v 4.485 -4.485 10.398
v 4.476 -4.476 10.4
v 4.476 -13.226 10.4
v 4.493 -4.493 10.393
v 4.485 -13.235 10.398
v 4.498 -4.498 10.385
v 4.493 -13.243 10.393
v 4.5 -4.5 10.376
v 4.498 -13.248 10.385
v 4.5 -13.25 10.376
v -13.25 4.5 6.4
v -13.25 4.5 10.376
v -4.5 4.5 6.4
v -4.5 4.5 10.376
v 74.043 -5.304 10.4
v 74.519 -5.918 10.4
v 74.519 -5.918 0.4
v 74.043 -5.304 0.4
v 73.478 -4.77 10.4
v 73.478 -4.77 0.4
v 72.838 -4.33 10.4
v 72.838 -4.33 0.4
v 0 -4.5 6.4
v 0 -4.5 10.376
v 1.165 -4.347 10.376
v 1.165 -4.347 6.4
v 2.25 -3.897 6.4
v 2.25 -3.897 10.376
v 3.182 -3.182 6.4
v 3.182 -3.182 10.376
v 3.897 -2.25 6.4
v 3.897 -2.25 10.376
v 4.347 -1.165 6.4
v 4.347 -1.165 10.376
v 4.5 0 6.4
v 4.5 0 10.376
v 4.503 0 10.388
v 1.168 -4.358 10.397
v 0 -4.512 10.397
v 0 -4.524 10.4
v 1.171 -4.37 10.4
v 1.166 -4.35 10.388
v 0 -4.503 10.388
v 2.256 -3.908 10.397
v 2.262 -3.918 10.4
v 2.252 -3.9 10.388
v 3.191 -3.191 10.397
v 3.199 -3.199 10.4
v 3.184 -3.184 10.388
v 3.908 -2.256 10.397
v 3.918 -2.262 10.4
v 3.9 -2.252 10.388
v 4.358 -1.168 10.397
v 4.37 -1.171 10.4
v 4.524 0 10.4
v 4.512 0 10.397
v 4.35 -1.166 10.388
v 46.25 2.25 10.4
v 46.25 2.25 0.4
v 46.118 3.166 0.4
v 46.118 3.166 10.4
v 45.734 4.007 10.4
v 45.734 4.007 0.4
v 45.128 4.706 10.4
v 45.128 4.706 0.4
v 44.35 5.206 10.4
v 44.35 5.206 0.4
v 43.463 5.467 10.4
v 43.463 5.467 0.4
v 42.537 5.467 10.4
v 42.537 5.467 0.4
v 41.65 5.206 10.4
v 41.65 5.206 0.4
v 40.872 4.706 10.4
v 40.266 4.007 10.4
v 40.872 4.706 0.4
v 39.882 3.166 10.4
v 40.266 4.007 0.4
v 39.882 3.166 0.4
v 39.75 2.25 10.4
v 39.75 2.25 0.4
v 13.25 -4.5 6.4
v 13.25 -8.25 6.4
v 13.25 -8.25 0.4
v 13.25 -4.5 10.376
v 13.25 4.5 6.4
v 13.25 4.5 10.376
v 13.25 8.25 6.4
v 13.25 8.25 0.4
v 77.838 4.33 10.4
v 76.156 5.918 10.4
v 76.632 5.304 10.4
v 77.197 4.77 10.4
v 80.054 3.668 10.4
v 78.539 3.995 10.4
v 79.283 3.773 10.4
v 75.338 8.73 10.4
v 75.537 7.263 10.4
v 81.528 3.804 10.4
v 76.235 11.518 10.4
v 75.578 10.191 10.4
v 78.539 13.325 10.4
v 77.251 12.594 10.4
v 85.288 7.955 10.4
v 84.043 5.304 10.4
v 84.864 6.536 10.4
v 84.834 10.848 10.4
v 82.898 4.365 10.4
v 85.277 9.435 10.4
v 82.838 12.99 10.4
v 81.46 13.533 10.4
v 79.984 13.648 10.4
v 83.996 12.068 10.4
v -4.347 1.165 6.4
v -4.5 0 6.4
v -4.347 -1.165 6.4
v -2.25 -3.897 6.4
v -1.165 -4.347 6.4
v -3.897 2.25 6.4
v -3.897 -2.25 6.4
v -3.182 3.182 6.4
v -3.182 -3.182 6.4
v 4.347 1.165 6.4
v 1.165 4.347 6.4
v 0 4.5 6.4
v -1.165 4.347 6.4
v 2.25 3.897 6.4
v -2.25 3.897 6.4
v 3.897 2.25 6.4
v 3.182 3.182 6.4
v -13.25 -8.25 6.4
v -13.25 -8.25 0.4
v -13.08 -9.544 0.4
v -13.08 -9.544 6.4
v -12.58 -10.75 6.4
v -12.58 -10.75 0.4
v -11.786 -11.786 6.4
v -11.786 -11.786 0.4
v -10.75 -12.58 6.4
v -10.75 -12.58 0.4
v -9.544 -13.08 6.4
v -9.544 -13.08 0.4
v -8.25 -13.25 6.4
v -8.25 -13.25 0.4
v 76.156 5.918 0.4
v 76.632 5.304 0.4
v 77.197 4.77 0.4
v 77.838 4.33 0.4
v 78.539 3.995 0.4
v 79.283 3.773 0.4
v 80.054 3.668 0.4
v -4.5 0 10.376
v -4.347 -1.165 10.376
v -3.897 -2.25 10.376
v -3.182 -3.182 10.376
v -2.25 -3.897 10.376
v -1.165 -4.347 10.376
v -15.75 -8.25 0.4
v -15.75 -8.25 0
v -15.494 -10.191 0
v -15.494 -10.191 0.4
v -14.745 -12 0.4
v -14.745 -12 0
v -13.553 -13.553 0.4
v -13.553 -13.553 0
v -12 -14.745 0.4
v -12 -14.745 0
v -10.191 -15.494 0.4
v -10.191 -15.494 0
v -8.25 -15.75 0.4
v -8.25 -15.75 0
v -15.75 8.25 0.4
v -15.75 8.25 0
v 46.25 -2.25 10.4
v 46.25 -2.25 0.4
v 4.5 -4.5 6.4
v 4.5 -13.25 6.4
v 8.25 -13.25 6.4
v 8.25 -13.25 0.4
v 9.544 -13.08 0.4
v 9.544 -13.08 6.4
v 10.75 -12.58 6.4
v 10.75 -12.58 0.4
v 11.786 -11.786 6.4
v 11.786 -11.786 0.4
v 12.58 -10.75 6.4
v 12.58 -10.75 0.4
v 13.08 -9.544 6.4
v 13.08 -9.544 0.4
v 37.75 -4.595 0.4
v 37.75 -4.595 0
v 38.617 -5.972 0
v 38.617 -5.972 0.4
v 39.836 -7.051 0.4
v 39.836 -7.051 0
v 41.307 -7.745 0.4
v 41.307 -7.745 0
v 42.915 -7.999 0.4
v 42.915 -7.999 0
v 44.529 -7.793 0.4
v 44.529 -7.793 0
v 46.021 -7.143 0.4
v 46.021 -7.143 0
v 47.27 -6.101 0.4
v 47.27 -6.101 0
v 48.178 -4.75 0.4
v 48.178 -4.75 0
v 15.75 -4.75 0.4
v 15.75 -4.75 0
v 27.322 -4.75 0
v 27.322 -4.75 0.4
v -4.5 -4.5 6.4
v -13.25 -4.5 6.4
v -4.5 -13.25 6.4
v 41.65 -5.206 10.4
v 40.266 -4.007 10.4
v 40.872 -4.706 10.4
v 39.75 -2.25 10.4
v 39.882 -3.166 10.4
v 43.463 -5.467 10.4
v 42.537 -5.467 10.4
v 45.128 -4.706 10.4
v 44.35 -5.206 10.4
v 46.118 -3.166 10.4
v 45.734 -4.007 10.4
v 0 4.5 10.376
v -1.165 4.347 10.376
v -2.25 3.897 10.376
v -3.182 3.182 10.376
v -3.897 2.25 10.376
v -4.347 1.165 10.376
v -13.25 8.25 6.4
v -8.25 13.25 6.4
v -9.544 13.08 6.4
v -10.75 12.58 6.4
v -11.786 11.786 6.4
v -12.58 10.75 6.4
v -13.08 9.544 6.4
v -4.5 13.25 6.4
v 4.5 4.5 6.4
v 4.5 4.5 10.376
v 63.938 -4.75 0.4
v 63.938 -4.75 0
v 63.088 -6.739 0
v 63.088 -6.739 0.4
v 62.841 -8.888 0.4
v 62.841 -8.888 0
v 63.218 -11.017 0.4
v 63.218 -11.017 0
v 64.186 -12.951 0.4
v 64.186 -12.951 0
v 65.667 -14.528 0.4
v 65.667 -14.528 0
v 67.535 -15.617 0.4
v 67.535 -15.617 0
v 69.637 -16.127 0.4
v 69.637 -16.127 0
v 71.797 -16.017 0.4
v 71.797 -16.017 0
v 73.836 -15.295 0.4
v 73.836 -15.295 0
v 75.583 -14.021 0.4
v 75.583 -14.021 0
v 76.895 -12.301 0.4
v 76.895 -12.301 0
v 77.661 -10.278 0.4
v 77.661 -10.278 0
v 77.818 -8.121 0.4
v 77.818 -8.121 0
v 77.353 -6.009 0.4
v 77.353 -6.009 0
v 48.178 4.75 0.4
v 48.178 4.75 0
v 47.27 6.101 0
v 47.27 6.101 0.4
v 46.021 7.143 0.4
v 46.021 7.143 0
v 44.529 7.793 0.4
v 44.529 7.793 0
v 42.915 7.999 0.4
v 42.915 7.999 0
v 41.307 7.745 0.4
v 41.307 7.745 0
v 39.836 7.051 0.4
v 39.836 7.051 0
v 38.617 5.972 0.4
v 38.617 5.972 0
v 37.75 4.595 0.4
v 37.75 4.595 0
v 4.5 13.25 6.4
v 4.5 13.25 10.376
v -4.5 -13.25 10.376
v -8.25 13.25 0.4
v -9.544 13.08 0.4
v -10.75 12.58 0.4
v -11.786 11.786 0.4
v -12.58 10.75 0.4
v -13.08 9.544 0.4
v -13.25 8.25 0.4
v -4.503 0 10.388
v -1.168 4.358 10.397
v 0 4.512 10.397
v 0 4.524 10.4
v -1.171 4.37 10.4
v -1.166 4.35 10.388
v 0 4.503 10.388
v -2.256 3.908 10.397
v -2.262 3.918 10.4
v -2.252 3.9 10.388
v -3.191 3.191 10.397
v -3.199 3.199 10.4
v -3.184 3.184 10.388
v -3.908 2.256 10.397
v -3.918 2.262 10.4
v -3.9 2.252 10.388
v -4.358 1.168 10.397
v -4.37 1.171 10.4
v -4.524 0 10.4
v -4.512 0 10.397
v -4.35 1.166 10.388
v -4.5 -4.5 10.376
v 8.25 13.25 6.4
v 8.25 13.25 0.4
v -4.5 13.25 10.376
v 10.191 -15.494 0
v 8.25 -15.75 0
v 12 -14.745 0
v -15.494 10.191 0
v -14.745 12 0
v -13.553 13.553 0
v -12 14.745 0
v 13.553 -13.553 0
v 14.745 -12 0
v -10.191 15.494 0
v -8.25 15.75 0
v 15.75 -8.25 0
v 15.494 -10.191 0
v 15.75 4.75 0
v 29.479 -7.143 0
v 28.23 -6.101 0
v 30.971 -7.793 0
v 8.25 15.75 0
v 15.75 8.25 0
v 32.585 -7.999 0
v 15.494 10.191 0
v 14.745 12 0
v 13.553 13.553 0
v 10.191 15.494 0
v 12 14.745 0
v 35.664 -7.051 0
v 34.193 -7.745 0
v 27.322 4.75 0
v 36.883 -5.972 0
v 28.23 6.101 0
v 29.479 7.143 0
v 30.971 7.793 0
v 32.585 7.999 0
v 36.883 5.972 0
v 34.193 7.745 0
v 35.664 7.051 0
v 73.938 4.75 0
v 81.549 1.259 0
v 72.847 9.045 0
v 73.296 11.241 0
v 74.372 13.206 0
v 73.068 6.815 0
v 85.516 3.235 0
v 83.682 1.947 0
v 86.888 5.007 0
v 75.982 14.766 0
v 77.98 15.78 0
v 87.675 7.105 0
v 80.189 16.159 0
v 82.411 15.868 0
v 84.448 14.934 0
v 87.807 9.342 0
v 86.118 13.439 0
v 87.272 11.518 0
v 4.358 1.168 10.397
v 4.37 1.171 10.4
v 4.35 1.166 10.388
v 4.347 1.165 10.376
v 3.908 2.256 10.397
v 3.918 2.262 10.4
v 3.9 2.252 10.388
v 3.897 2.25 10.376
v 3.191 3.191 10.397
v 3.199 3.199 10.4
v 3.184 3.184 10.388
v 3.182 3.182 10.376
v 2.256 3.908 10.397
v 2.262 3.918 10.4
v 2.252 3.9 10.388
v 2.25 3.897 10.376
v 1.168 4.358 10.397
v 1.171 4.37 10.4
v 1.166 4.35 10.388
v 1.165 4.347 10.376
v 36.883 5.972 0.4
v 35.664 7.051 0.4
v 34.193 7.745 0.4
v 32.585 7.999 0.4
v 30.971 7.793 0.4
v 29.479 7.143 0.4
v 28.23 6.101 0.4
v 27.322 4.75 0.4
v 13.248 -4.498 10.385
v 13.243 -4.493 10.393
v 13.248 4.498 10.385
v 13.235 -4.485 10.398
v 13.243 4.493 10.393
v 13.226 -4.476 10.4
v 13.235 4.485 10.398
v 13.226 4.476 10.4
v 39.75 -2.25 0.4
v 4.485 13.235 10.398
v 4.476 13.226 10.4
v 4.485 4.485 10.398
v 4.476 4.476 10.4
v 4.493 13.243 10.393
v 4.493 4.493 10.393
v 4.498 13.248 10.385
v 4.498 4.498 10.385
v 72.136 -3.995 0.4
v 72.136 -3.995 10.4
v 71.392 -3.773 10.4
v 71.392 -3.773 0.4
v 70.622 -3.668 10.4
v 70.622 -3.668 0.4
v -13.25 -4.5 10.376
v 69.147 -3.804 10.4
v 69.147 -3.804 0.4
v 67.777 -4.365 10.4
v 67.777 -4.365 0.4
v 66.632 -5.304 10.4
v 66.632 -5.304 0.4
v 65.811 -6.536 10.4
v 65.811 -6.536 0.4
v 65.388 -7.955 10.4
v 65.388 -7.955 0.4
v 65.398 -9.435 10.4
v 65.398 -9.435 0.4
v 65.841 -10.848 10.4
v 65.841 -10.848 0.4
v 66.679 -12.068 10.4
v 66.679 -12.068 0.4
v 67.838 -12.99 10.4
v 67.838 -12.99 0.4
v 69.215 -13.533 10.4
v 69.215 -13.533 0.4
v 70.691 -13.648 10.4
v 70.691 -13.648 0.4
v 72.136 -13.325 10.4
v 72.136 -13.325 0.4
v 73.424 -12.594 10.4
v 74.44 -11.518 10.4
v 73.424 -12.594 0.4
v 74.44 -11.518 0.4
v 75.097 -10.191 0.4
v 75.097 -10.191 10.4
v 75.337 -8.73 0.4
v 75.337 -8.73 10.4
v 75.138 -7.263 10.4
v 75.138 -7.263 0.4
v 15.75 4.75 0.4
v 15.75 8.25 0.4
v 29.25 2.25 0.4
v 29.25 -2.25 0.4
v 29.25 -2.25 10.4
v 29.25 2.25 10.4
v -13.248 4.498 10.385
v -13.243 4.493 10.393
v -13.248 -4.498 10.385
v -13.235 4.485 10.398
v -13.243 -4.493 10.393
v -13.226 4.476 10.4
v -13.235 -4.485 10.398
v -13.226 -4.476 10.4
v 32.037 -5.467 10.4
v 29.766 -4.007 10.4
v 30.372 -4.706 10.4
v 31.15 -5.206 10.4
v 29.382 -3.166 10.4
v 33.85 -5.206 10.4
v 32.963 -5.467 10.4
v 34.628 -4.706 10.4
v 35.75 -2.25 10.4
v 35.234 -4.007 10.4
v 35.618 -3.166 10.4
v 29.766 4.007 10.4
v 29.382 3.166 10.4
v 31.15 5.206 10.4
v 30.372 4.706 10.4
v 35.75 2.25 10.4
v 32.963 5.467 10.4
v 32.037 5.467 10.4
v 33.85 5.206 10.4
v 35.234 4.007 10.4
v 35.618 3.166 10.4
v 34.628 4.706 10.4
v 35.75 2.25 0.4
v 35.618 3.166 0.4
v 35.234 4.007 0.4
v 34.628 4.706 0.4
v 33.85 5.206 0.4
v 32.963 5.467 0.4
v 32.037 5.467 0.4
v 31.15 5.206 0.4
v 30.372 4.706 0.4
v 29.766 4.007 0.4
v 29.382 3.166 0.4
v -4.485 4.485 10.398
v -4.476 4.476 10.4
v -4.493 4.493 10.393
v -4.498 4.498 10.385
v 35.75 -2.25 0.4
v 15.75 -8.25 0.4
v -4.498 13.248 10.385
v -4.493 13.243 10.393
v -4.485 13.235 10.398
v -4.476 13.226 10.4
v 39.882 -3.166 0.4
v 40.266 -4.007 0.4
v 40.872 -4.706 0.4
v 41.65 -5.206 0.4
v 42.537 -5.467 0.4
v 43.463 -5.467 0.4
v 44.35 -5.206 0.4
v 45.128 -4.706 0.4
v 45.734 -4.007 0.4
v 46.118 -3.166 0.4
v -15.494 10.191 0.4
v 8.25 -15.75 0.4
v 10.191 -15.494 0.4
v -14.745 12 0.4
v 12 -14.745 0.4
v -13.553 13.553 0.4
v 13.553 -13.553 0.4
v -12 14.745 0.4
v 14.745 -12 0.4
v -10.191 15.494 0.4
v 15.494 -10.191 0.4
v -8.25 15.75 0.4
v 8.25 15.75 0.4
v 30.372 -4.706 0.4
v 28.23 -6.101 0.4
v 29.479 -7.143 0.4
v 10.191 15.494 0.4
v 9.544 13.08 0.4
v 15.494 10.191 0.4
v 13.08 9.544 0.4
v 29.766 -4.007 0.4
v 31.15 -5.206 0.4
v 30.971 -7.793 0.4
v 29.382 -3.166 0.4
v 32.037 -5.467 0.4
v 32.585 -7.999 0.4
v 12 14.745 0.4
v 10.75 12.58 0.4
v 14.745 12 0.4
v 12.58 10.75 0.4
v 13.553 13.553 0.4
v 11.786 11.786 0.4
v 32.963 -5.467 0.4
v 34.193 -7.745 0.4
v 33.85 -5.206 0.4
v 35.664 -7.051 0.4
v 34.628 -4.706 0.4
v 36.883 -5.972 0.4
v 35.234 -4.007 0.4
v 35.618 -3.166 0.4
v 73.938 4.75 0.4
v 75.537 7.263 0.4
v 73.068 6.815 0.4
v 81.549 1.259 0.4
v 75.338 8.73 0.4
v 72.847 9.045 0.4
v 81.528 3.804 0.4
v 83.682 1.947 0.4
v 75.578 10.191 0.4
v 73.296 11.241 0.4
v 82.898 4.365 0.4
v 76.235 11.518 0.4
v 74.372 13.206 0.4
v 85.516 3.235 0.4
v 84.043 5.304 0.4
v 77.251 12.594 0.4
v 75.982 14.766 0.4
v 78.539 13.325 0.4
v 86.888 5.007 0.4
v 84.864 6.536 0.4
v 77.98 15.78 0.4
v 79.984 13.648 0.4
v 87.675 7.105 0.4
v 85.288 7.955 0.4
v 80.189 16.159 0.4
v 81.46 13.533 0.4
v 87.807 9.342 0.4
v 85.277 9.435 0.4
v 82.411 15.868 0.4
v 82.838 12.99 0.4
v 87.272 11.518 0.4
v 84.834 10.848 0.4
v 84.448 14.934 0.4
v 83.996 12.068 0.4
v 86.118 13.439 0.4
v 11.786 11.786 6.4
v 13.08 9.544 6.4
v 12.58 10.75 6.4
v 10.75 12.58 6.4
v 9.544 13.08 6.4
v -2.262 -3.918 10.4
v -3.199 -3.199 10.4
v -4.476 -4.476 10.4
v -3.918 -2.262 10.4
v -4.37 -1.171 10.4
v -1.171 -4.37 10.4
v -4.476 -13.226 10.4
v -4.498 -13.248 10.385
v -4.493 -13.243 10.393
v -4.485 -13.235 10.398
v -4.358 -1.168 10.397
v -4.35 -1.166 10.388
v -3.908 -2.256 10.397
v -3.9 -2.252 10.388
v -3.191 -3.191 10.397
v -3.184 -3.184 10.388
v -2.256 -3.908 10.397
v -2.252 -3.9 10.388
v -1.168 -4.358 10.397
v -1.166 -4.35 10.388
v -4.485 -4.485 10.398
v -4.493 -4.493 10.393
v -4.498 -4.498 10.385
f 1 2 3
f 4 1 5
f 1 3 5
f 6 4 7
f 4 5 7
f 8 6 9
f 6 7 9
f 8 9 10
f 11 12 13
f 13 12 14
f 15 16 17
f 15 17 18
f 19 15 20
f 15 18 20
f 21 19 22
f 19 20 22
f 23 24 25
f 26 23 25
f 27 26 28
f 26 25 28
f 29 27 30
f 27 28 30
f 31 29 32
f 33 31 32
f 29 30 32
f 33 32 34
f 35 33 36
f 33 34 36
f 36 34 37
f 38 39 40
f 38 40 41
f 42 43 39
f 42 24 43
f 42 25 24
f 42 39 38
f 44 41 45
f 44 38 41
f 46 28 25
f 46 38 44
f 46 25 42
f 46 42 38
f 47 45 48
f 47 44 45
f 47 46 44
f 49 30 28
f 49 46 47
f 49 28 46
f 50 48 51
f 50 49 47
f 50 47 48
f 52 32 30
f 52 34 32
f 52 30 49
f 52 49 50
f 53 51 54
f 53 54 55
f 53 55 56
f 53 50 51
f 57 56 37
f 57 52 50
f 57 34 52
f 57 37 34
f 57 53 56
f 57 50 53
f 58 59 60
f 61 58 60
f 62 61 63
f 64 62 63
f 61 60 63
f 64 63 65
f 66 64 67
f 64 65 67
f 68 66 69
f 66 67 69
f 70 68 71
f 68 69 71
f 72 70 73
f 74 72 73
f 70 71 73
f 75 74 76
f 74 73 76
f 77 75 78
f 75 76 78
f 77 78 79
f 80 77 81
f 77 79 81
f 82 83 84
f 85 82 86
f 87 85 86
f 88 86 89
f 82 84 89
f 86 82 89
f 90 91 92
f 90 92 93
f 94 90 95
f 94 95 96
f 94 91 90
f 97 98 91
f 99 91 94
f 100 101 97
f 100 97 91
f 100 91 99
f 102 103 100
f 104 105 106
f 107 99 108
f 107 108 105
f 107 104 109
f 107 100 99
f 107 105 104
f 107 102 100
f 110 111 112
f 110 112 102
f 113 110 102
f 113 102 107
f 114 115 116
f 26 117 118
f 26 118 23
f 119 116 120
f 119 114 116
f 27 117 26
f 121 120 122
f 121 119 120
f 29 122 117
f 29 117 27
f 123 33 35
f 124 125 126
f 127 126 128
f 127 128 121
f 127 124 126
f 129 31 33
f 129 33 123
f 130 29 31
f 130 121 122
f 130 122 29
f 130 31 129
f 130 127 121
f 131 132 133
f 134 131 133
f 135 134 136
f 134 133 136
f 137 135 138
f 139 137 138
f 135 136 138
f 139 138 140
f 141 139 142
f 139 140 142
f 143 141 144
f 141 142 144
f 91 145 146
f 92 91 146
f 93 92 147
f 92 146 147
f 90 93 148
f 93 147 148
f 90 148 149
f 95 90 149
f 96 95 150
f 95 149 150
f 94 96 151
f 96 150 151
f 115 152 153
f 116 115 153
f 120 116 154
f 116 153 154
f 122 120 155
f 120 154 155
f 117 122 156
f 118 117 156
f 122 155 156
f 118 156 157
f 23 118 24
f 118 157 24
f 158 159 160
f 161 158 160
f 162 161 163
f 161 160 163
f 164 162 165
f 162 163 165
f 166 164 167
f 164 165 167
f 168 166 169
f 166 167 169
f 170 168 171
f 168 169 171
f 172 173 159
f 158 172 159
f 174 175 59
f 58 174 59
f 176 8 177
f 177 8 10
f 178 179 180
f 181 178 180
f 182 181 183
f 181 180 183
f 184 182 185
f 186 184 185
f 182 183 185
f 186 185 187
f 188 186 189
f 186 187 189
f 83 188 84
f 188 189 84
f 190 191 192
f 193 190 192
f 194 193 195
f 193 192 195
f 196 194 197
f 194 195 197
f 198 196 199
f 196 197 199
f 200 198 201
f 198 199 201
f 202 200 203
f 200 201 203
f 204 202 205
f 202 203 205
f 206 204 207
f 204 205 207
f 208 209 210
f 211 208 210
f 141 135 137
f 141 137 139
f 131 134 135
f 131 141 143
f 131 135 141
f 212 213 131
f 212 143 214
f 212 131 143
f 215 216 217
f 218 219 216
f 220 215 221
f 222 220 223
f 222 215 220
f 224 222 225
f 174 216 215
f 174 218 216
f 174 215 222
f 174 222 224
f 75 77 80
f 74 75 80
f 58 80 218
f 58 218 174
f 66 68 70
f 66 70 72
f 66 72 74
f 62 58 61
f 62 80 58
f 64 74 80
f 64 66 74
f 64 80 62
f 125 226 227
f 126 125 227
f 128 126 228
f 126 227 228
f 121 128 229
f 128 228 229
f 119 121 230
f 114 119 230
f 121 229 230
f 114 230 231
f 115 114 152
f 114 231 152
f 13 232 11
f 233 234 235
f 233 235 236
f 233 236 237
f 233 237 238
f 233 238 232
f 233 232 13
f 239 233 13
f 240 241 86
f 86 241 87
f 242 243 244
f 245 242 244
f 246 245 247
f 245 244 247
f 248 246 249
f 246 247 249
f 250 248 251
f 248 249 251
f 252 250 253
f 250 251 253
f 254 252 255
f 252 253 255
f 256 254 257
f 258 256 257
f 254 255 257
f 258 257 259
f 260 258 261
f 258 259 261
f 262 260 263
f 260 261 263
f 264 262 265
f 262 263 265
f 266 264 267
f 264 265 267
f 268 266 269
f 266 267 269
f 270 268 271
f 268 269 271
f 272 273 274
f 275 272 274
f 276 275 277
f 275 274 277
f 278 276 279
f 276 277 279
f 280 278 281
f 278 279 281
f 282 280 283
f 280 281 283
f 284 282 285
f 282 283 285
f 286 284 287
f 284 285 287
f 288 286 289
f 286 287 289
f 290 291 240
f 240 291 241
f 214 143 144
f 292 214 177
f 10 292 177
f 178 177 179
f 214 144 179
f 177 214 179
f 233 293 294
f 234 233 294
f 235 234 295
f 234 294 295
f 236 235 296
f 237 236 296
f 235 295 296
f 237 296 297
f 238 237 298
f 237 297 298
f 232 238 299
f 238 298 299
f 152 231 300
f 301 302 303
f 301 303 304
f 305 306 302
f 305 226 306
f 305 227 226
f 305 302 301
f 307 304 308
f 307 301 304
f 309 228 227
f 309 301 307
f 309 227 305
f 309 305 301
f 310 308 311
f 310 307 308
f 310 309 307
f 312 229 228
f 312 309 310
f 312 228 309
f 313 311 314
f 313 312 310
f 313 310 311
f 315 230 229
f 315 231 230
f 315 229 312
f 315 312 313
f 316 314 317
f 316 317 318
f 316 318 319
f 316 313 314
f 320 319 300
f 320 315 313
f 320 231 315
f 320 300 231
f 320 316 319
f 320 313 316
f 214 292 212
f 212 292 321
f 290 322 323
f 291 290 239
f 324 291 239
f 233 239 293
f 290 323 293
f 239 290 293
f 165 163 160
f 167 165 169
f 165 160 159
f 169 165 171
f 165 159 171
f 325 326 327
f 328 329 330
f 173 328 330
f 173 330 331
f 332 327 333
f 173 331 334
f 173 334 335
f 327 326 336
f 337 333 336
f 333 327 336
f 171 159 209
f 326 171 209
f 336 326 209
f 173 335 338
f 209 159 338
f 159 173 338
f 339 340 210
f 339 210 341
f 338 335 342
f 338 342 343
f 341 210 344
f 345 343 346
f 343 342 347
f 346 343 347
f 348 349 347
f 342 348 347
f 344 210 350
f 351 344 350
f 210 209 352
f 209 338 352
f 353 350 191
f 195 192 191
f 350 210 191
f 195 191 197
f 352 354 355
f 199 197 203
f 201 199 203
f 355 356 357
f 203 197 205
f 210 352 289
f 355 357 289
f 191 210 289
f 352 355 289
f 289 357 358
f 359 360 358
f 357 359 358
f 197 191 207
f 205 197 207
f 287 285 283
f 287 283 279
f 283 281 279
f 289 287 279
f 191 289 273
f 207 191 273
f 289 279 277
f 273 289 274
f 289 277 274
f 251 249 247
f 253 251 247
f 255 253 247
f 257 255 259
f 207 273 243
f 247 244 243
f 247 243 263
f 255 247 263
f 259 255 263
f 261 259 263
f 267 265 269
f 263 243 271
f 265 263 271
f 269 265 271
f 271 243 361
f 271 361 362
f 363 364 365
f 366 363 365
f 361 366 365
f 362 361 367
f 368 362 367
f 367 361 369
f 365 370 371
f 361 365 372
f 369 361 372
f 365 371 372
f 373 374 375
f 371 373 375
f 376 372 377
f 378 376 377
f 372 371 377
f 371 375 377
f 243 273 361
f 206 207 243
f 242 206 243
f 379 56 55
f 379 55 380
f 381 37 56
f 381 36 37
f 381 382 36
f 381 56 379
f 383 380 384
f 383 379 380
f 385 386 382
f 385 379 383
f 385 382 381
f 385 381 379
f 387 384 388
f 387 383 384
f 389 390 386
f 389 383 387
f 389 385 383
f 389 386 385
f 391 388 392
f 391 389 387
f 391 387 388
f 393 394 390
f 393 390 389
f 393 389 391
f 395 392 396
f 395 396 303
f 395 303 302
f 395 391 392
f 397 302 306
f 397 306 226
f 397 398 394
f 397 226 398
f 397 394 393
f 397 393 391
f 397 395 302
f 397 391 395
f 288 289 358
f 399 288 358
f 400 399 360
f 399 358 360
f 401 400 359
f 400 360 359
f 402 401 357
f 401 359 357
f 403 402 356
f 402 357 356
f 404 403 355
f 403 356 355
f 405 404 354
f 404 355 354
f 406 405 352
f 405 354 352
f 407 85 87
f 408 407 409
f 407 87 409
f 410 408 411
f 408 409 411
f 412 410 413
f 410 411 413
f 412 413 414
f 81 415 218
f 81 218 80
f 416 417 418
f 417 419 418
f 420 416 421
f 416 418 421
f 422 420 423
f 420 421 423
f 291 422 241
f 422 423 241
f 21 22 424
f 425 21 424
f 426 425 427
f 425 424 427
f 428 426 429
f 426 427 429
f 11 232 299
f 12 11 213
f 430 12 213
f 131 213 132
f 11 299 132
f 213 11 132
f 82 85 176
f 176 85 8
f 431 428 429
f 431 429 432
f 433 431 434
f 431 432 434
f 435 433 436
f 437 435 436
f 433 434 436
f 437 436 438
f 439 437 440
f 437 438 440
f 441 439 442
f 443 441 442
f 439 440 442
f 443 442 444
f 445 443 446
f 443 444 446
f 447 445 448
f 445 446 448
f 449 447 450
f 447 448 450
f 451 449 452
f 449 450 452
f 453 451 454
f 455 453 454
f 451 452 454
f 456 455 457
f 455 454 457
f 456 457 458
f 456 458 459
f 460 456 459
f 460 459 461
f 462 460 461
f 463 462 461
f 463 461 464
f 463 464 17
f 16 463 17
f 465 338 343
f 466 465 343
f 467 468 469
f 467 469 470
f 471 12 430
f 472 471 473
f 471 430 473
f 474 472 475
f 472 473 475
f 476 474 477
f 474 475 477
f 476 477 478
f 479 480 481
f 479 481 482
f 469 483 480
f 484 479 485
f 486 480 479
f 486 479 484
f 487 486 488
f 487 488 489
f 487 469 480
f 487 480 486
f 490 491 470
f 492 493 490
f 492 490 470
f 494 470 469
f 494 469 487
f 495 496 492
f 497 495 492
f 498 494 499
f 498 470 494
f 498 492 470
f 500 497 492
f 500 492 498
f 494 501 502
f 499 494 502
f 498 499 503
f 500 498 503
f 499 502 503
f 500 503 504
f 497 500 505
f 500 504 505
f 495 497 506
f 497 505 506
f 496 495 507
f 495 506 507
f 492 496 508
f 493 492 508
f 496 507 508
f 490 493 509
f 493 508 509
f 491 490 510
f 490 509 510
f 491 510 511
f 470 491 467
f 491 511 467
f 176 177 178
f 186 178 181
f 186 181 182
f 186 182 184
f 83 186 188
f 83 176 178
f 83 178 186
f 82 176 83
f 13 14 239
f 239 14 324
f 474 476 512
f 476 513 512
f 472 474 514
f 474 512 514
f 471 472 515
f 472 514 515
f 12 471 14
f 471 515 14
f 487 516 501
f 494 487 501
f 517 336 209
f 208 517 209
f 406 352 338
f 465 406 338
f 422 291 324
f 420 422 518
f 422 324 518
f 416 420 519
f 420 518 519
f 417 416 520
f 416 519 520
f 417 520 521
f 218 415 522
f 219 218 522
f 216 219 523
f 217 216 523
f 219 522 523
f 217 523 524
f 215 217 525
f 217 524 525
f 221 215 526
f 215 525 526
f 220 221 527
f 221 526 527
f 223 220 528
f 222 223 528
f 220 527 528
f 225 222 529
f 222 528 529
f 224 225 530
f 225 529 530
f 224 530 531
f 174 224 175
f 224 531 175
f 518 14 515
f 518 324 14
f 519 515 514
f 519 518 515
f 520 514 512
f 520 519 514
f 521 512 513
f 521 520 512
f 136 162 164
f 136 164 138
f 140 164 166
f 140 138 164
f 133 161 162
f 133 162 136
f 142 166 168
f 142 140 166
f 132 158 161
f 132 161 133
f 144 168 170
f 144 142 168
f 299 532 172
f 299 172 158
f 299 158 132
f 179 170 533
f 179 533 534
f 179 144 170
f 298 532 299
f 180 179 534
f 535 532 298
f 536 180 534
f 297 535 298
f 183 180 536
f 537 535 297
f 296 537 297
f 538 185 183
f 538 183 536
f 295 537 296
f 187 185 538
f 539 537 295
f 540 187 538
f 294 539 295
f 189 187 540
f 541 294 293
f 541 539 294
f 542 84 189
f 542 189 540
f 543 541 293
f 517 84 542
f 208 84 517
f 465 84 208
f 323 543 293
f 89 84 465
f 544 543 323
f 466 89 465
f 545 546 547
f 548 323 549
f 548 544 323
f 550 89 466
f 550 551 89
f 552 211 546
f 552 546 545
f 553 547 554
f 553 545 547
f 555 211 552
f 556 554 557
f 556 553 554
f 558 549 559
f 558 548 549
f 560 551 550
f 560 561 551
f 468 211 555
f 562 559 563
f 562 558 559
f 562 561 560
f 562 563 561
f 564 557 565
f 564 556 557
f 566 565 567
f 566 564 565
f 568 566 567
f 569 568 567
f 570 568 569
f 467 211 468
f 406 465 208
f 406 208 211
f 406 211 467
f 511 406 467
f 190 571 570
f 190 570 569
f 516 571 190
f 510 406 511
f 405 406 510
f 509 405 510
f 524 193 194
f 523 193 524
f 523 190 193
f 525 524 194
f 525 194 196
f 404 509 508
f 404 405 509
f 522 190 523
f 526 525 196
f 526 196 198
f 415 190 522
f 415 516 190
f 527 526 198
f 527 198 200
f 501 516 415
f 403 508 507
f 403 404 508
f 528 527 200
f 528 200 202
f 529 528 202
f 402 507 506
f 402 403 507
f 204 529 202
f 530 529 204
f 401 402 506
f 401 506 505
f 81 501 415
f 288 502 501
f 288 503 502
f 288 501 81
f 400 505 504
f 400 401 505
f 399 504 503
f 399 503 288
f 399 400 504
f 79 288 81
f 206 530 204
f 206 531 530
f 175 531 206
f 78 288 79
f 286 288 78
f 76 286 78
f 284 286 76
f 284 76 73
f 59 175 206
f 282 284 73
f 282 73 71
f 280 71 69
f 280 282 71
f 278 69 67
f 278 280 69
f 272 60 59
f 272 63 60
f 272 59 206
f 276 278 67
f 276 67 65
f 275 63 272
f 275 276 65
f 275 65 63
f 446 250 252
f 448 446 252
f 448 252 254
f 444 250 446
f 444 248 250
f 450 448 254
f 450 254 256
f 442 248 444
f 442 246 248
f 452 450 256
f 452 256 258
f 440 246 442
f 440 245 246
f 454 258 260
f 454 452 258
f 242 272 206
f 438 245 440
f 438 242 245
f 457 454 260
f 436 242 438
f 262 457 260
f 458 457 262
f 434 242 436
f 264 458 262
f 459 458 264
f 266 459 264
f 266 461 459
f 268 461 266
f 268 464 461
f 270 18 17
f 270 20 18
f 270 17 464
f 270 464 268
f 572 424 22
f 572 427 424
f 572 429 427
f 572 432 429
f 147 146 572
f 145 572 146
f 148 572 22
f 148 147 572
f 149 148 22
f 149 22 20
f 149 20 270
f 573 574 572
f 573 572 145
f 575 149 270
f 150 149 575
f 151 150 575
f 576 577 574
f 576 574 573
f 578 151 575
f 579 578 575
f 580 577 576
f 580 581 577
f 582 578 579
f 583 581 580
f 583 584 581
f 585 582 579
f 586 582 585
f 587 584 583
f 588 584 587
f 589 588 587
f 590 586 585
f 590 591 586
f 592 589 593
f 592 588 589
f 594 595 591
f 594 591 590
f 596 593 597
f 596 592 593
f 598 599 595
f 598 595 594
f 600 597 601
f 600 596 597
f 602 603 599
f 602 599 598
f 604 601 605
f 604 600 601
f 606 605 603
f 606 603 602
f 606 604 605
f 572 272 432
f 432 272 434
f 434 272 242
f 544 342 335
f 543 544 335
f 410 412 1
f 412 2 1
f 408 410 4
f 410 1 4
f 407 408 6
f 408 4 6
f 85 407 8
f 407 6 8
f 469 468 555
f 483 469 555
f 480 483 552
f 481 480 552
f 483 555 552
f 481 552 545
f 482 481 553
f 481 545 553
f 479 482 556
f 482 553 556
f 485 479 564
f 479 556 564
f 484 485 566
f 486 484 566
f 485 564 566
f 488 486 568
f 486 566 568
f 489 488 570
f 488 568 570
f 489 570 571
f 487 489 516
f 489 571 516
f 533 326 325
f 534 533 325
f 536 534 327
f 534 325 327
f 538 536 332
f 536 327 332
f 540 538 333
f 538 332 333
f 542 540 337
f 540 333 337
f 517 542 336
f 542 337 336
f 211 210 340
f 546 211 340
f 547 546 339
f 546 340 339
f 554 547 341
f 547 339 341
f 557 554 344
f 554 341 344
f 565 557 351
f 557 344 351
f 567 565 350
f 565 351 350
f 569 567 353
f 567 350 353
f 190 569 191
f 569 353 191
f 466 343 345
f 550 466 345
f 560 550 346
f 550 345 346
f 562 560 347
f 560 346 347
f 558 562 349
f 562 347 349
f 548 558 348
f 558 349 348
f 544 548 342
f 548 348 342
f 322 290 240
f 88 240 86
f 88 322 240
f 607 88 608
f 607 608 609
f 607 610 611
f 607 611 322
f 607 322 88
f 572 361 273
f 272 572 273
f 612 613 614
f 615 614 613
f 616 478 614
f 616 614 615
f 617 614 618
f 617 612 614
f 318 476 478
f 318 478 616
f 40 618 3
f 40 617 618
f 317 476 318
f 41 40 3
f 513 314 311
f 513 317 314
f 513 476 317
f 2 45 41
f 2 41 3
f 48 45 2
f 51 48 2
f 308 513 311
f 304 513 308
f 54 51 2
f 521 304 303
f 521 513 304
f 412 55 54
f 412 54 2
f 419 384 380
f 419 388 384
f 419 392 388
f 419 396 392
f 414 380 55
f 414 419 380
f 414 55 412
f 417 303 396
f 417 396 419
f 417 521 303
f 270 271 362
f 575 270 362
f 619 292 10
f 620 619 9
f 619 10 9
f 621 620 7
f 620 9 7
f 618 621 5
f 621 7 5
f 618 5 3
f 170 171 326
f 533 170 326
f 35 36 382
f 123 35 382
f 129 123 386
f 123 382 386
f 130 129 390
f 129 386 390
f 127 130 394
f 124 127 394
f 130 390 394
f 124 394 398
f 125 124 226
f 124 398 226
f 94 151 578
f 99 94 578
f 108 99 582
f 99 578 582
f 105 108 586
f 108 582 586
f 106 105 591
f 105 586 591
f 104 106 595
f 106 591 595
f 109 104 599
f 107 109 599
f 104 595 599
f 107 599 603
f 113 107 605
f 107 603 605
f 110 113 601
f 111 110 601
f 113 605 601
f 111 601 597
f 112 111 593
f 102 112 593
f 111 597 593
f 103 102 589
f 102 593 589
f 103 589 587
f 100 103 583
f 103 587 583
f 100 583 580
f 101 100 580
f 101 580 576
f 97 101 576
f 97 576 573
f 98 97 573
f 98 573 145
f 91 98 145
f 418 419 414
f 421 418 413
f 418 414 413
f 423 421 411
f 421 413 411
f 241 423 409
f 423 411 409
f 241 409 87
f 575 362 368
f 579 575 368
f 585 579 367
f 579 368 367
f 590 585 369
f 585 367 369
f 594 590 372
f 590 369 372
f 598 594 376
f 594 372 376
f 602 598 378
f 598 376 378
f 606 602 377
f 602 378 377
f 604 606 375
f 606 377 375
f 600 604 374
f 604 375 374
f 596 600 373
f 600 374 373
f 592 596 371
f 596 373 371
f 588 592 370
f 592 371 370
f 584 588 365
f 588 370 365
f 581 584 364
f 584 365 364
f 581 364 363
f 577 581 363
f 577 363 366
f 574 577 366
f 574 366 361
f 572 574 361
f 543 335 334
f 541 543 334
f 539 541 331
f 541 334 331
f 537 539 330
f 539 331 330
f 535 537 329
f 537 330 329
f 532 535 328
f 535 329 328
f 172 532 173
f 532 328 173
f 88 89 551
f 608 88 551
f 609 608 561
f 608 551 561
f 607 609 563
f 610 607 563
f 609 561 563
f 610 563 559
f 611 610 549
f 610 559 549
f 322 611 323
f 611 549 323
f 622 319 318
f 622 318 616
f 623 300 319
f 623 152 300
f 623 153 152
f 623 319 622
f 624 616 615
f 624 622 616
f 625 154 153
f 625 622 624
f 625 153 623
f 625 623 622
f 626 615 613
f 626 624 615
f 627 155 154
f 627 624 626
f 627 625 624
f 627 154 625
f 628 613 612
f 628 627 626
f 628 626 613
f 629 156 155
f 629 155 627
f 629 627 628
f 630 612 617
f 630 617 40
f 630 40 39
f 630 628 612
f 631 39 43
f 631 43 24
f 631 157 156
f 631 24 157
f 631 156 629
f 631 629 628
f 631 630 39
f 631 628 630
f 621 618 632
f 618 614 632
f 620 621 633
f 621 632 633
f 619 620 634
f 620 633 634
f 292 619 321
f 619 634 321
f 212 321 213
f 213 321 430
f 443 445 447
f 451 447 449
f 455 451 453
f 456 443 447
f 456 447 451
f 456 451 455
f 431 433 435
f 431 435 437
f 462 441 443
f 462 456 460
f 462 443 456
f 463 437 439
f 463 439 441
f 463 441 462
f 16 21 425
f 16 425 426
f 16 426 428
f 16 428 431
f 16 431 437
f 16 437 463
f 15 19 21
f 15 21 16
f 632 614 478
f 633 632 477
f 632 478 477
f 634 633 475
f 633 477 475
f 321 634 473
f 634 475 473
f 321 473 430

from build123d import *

# Parameters (mm, degrees)
F0_W     = 6.5
F0_H     = 4.5
F0_W_2   = 4
F0_W_3   = 16
F1_DEPTH = 0.4
F2_W     = 6.5
F2_H     = 4.5
F3_DEPTH = 10
F5_DEPTH = 4
F6_R     = 0.0241421356


with BuildPart() as f1:
    # F0 (on Top) → F1 (new body)
    with BuildSketch(Plane.XY):
        with BuildLine():
            Line((8.25, 15.75), (-8.25, 15.75))
            ThreePointArc((-8.25, 15.75), (-13.5533008589, 13.5533008589), (-15.75, 8.25))
            Line((-15.75, 8.25), (-15.75, -8.25))
            ThreePointArc((-15.75, -8.25), (-13.5533008589, -13.5533008589), (-8.25, -15.75))
            Line((-8.25, -15.75), (8.25, -15.75))
            ThreePointArc((8.25, -15.75), (13.5533008589, -13.5533008589), (15.75, -8.25))
            Line((15.75, -8.25), (15.75, -4.75))
            Line((15.75, -4.75), (27.3219212057, -4.75))
            ThreePointArc((27.3219212057, -4.75), (32.5853423404, -7.9993666334), (37.75, -4.5952078799))
            ThreePointArc((37.75, -4.5952078799), (42.9146576596, -7.9993666334), (48.1780787943, -4.75))
            Line((48.1780787943, -4.75), (63.9376083391, -4.75))
            ThreePointArc((63.9376083391, -4.75), (69.6369704789, -16.1274567319), (77.3532689299, -6.0087617221))
            Line((77.3532689299, -6.0087617221), (81.5491755468, 1.2587617221))
            ThreePointArc((81.5491755468, 1.2587617221), (83.4644385935, 15.4773568118), (73.9376083391, 4.75))
            Line((73.9376083391, 4.75), (48.1780787943, 4.75))
            ThreePointArc((48.1780787943, 4.75), (42.9146576596, 7.9993666334), (37.75, 4.5952078799))
            ThreePointArc((37.75, 4.5952078799), (32.5853423404, 7.9993666334), (27.3219212057, 4.75))
            Line((27.3219212057, 4.75), (15.75, 4.75))
            Line((15.75, 4.75), (15.75, 8.25))
            ThreePointArc((15.75, 8.25), (13.5533008589, 13.5533008589), (8.25, 15.75))
        make_face()
        with BuildLine():
            ThreePointArc((-13.25, 8.25), (-11.7855339059, 11.7855339059), (-8.25, 13.25))
            Line((-8.25, 13.25), (-4.5, 13.25))
            Line((-4.5, 13.25), (4.5, 13.25))
            Line((4.5, 13.25), (8.25, 13.25))
            ThreePointArc((8.25, 13.25), (11.7855339059, 11.7855339059), (13.25, 8.25))
            Line((13.25, 8.25), (13.25, 4.5))
            Line((13.25, 4.5), (13.25, 2.25))
            Line((13.25, 2.25), (29.25, 2.25))
            ThreePointArc((29.25, 2.25), (32.5, 5.5), (35.75, 2.25))
            Line((35.75, 2.25), (39.75, 2.25))
            ThreePointArc((39.75, 2.25), (43, 5.5), (46.25, 2.25))
            Line((46.25, 2.25), (74.0385634647, 2.25))
            Line((74.0385634647, 2.25), (76.1564730244, 5.9183269633))
            ThreePointArc((76.1564730244, 5.9183269633), (82.8376015704, 12.9903810568), (80.0535873414, 3.6683269633))
            Line((80.0535873414, 3.6683269633), (74.5187301163, -5.9183269633))
            ThreePointArc((74.5187301163, -5.9183269633), (67.8376015704, -12.9903810568), (70.6216157993, -3.6683269633))
            Line((70.6216157993, -3.6683269633), (71.4404872533, -2.25))
            Line((71.4404872533, -2.25), (46.25, -2.25))
            ThreePointArc((46.25, -2.25), (43, -5.5), (39.75, -2.25))
            Line((39.75, -2.25), (35.75, -2.25))
            ThreePointArc((35.75, -2.25), (32.5, -5.5), (29.25, -2.25))
            Line((29.25, -2.25), (13.25, -2.25))
            Line((13.25, -2.25), (13.25, -4.5))
            Line((13.25, -4.5), (13.25, -8.25))
            ThreePointArc((13.25, -8.25), (11.7855339059, -11.7855339059), (8.25, -13.25))
            Line((8.25, -13.25), (4.5, -13.25))
            Line((4.5, -13.25), (-4.5, -13.25))
            Line((-4.5, -13.25), (-8.25, -13.25))
            ThreePointArc((-8.25, -13.25), (-11.7855339059, -11.7855339059), (-13.25, -8.25))
            Line((-13.25, -8.25), (-13.25, -4.5))
            Line((-13.25, -4.5), (-13.25, 4.5))
            Line((-13.25, 4.5), (-13.25, 8.25))
        make_face(mode=Mode.SUBTRACT)
        Polygon((4.5, -4.5), (0, -4.5), (-4.5, -4.5), (-4.5, -13.25), (4.5, -13.25), align=None)
        with BuildLine():
            Line((76.1564730244, 5.9183269633), (74.0385634647, 2.25))
            Line((74.0385634647, 2.25), (71.4404872533, -2.25))
            Line((71.4404872533, -2.25), (70.6216157993, -3.6683269633))
            ThreePointArc((70.6216157993, -3.6683269633), (72.8376015704, -4.3301270189), (74.5187301163, -5.9183269633))
            Line((74.5187301163, -5.9183269633), (80.0535873414, 3.6683269633))
            ThreePointArc((80.0535873414, 3.6683269633), (77.8376015704, 4.3301270189), (76.1564730244, 5.9183269633))
        make_face()
        with Locations((32.5, 0)):
            Rectangle(F0_W, F0_H)
        with BuildLine():
            ThreePointArc((35.75, 2.25), (32.5, 5.5), (29.25, 2.25))
            Line((29.25, 2.25), (35.75, 2.25))
        make_face()
        Polygon((74.0385634647, 2.25), (46.25, 2.25), (46.25, -2.25), (71.4404872533, -2.25), align=None)
        with BuildLine():
            Line((35.75, -2.25), (29.25, -2.25))
            ThreePointArc((29.25, -2.25), (32.5, -5.5), (35.75, -2.25))
        make_face()
        with Locations((37.75, 0)):
            Rectangle(F0_W_2, F0_H)
        Polygon((-4.5, 0), (-4.5, 4.5), (-13.25, 4.5), (-13.25, -4.5), (-4.5, -4.5), align=None)
        with BuildLine():
            ThreePointArc((46.25, 2.25), (43, 5.5), (39.75, 2.25))
            Line((39.75, 2.25), (46.25, 2.25))
        make_face()
        with BuildLine():
            Line((-4.5, -4.5), (-13.25, -4.5))
            Line((-13.25, -4.5), (-13.25, -8.25))
            ThreePointArc((-13.25, -8.25), (-11.7855339059, -11.7855339059), (-8.25, -13.25))
            Line((-8.25, -13.25), (-4.5, -13.25))
            Line((-4.5, -13.25), (-4.5, -4.5))
        make_face()
        with BuildLine():
            Line((13.25, -4.5), (4.5, -4.5))
            Line((4.5, -4.5), (4.5, -13.25))
            Line((4.5, -13.25), (8.25, -13.25))
            ThreePointArc((8.25, -13.25), (11.7855339059, -11.7855339059), (13.25, -8.25))
            Line((13.25, -8.25), (13.25, -4.5))
        make_face()
        with BuildLine():
            Line((46.25, -2.25), (39.75, -2.25))
            ThreePointArc((39.75, -2.25), (43, -5.5), (46.25, -2.25))
        make_face()
        with BuildLine():
            ThreePointArc((74.5187301163, -5.9183269633), (72.8376015704, -4.3301270189), (70.6216157993, -3.6683269633))
            ThreePointArc((70.6216157993, -3.6683269633), (67.8376015704, -12.9903810568), (74.5187301163, -5.9183269633))
        make_face()
        with BuildLine():
            ThreePointArc((80.0535873414, 3.6683269633), (82.8376015704, 12.9903810568), (76.1564730244, 5.9183269633))
            ThreePointArc((76.1564730244, 5.9183269633), (77.8376015704, 4.3301270189), (80.0535873414, 3.6683269633))
        make_face()
        Polygon((13.25, 4.5), (4.5, 4.5), (4.5, 0), (4.5, -4.5), (13.25, -4.5), (13.25, -2.25), (13.25, 2.25), align=None)
        with BuildLine():
            Line((-4.5, 13.25), (-8.25, 13.25))
            ThreePointArc((-8.25, 13.25), (-11.7855339059, 11.7855339059), (-13.25, 8.25))
            Line((-13.25, 8.25), (-13.25, 4.5))
            Line((-13.25, 4.5), (-4.5, 4.5))
            Line((-4.5, 4.5), (-4.5, 13.25))
        make_face()
        Polygon((4.5, 13.25), (-4.5, 13.25), (-4.5, 4.5), (0, 4.5), (4.5, 4.5), align=None)
        with BuildLine():
            Line((8.25, 13.25), (4.5, 13.25))
            Line((4.5, 13.25), (4.5, 4.5))
            Line((4.5, 4.5), (13.25, 4.5))
            Line((13.25, 4.5), (13.25, 8.25))
            ThreePointArc((13.25, 8.25), (11.7855339059, 11.7855339059), (8.25, 13.25))
        make_face()
        with Locations((21.25, 0)):
            Rectangle(F0_W_3, F0_H)
        with Locations((43, 0)):
            Rectangle(F0_W, F0_H)
        with BuildLine():
            ThreePointArc((0, 4.5), (-3.1819805153, 3.1819805153), (-4.5, 0))
            ThreePointArc((-4.5, 0), (-3.1819805153, -3.1819805153), (0, -4.5))
            ThreePointArc((0, -4.5), (3.1819805153, -3.1819805153), (4.5, 0))
            ThreePointArc((4.5, 0), (3.1819805153, 3.1819805153), (0, 4.5))
        make_face()
        with BuildLine():
            Line((4.5, 0), (4.5, 4.5))
            Line((4.5, 4.5), (0, 4.5))
            ThreePointArc((0, 4.5), (3.1819805153, 3.1819805153), (4.5, 0))
        make_face()
        with BuildLine():
            Line((4.5, -4.5), (4.5, 0))
            ThreePointArc((4.5, 0), (3.1819805153, -3.1819805153), (0, -4.5))
            Line((0, -4.5), (4.5, -4.5))
        make_face()
        with BuildLine():
            ThreePointArc((0, -4.5), (-3.1819805153, -3.1819805153), (-4.5, 0))
            Line((-4.5, 0), (-4.5, -4.5))
            Line((-4.5, -4.5), (0, -4.5))
        make_face()
        with BuildLine():
            Line((0, 4.5), (-4.5, 4.5))
            Line((-4.5, 4.5), (-4.5, 0))
            ThreePointArc((-4.5, 0), (-3.1819805153, 3.1819805153), (0, 4.5))
        make_face()
    extrude(amount=F1_DEPTH)

    # F2 (on face) → F3 (join)
    with BuildSketch(Plane.XY.offset(0.4)):
        Polygon((4.5, 13.25), (-4.5, 13.25), (-4.5, 4.5), (0, 4.5), (4.5, 4.5), align=None)
        Polygon((-4.5, 0), (-4.5, 4.5), (-13.25, 4.5), (-13.25, -4.5), (-4.5, -4.5), align=None)
        Polygon((13.25, 4.5), (4.5, 4.5), (4.5, 0), (4.5, -4.5), (13.25, -4.5), (13.25, -2.25), (13.25, 2.25), align=None)
        Polygon((4.5, -4.5), (0, -4.5), (-4.5, -4.5), (-4.5, -13.25), (4.5, -13.25), align=None)
        with BuildLine():
            Line((4.5, -4.5), (4.5, 0))
            ThreePointArc((4.5, 0), (3.1819805153, -3.1819805153), (0, -4.5))
            Line((0, -4.5), (4.5, -4.5))
        make_face()
        with BuildLine():
            ThreePointArc((0, -4.5), (-3.1819805153, -3.1819805153), (-4.5, 0))
            Line((-4.5, 0), (-4.5, -4.5))
            Line((-4.5, -4.5), (0, -4.5))
        make_face()
        with BuildLine():
            Line((0, 4.5), (-4.5, 4.5))
            Line((-4.5, 4.5), (-4.5, 0))
            ThreePointArc((-4.5, 0), (-3.1819805153, 3.1819805153), (0, 4.5))
        make_face()
        with BuildLine():
            Line((4.5, 0), (4.5, 4.5))
            Line((4.5, 4.5), (0, 4.5))
            ThreePointArc((0, 4.5), (3.1819805153, 3.1819805153), (4.5, 0))
        make_face()
        with Locations((32.5, 0)):
            Rectangle(F2_W, F2_H)
        with BuildLine():
            ThreePointArc((35.75, 2.25), (32.5, 5.5), (29.25, 2.25))
            Line((29.25, 2.25), (35.75, 2.25))
        make_face()
        with BuildLine():
            Line((35.75, -2.25), (29.25, -2.25))
            ThreePointArc((29.25, -2.25), (32.5, -5.5), (35.75, -2.25))
        make_face()
        with BuildLine():
            ThreePointArc((46.25, 2.25), (43, 5.5), (39.75, 2.25))
            Line((39.75, 2.25), (46.25, 2.25))
        make_face()
        with Locations((43, 0)):
            Rectangle(F2_W, F2_H)
        with BuildLine():
            Line((46.25, -2.25), (39.75, -2.25))
            ThreePointArc((39.75, -2.25), (43, -5.5), (46.25, -2.25))
        make_face()
        with BuildLine():
            ThreePointArc((80.0535873414, 3.6683269633), (82.8376015704, 12.9903810568), (76.1564730244, 5.9183269633))
            ThreePointArc((76.1564730244, 5.9183269633), (76.9039498076, 5.0256927751), (77.8376015704, 4.3301270189))
            ThreePointArc((77.8376015704, 4.3301270189), (78.9068050666, 3.8693437522), (80.0535873414, 3.6683269633))
        make_face()
        with BuildLine():
            ThreePointArc((72.8376015704, -4.3301270189), (71.7683980741, -3.8693437522), (70.6216157993, -3.6683269633))
            ThreePointArc((70.6216157993, -3.6683269633), (67.8376015704, -12.9903810568), (74.5187301163, -5.9183269633))
            ThreePointArc((74.5187301163, -5.9183269633), (73.7712533331, -5.0256927751), (72.8376015704, -4.3301270189))
        make_face()
        with BuildLine():
            Line((8.25, 13.25), (4.5, 13.25))
            Line((4.5, 13.25), (4.5, 4.5))
            Line((4.5, 4.5), (13.25, 4.5))
            Line((13.25, 4.5), (13.25, 8.25))
            ThreePointArc((13.25, 8.25), (11.7855339059, 11.7855339059), (8.25, 13.25))
        make_face()
        with BuildLine():
            Line((-4.5, 13.25), (-8.25, 13.25))
            ThreePointArc((-8.25, 13.25), (-11.7855339059, 11.7855339059), (-13.25, 8.25))
            Line((-13.25, 8.25), (-13.25, 4.5))
            Line((-13.25, 4.5), (-4.5, 4.5))
            Line((-4.5, 4.5), (-4.5, 13.25))
        make_face()
        with BuildLine():
            Line((-4.5, -4.5), (-13.25, -4.5))
            Line((-13.25, -4.5), (-13.25, -8.25))
            ThreePointArc((-13.25, -8.25), (-11.7855339059, -11.7855339059), (-8.25, -13.25))
            Line((-8.25, -13.25), (-4.5, -13.25))
            Line((-4.5, -13.25), (-4.5, -4.5))
        make_face()
        with BuildLine():
            ThreePointArc((0, 4.5), (-3.1819805153, 3.1819805153), (-4.5, 0))
            ThreePointArc((-4.5, 0), (-3.1819805153, -3.1819805153), (0, -4.5))
            ThreePointArc((0, -4.5), (3.1819805153, -3.1819805153), (4.5, 0))
            ThreePointArc((4.5, 0), (3.1819805153, 3.1819805153), (0, 4.5))
        make_face()
        with BuildLine():
            Line((13.25, -4.5), (4.5, -4.5))
            Line((4.5, -4.5), (4.5, -13.25))
            Line((4.5, -13.25), (8.25, -13.25))
            ThreePointArc((8.25, -13.25), (11.7855339059, -11.7855339059), (13.25, -8.25))
            Line((13.25, -8.25), (13.25, -4.5))
        make_face()
    extrude(amount=F3_DEPTH)

    # F4 (on face) → F5 (cut)
    with BuildSketch(Plane.XY.offset(10.4)):
        with BuildLine():
            Line((8.25, 13.25), (4.5, 13.25))
            Line((4.5, 13.25), (4.5, 4.5))
            Line((4.5, 4.5), (13.25, 4.5))
            Line((13.25, 4.5), (13.25, 8.25))
            ThreePointArc((13.25, 8.25), (11.7855339059, 11.7855339059), (8.25, 13.25))
        make_face()
        with BuildLine():
            Line((-4.5, 13.25), (-8.25, 13.25))
            ThreePointArc((-8.25, 13.25), (-11.7855339059, 11.7855339059), (-13.25, 8.25))
            Line((-13.25, 8.25), (-13.25, 4.5))
            Line((-13.25, 4.5), (-4.5, 4.5))
            Line((-4.5, 4.5), (-4.5, 13.25))
        make_face()
        with BuildLine():
            Line((-4.5, -4.5), (-13.25, -4.5))
            Line((-13.25, -4.5), (-13.25, -8.25))
            ThreePointArc((-13.25, -8.25), (-11.7855339059, -11.7855339059), (-8.25, -13.25))
            Line((-8.25, -13.25), (-4.5, -13.25))
            Line((-4.5, -13.25), (-4.5, -4.5))
        make_face()
        with BuildLine():
            Line((13.25, -4.5), (4.5, -4.5))
            Line((4.5, -4.5), (4.5, -13.25))
            Line((4.5, -13.25), (8.25, -13.25))
            ThreePointArc((8.25, -13.25), (11.7855339059, -11.7855339059), (13.25, -8.25))
            Line((13.25, -8.25), (13.25, -4.5))
        make_face()
        with BuildLine():
            ThreePointArc((0, 4.5), (-3.1819805153, 3.1819805153), (-4.5, 0))
            ThreePointArc((-4.5, 0), (-3.1819805153, -3.1819805153), (0, -4.5))
            ThreePointArc((0, -4.5), (3.1819805153, -3.1819805153), (4.5, 0))
            ThreePointArc((4.5, 0), (3.1819805153, 3.1819805153), (0, 4.5))
        make_face()
    extrude(amount=-F5_DEPTH, mode=Mode.SUBTRACT)

    # F6
    f6_edges = [f1.edges().sort_by_distance(p)[0] for p in [
        (13.25, 0, 10.4),
        (8.875, -4.5, 10.4),
        (4.5, -8.875, 10.4),
        (0, -13.25, 10.4),
        (-4.5, -8.875, 10.4),
        (-8.875, -4.5, 10.4),
        (-13.25, 0, 10.4),
        (-8.875, 4.5, 10.4),
        (-4.5, 8.875, 10.4),
        (0, 13.25, 10.4),
        (4.5, 8.875, 10.4),
        (8.875, 4.5, 10.4),
        (-4.5, 0, 10.4),
    ]]
    fillet(f6_edges, radius=F6_R)


solid = f1.part
